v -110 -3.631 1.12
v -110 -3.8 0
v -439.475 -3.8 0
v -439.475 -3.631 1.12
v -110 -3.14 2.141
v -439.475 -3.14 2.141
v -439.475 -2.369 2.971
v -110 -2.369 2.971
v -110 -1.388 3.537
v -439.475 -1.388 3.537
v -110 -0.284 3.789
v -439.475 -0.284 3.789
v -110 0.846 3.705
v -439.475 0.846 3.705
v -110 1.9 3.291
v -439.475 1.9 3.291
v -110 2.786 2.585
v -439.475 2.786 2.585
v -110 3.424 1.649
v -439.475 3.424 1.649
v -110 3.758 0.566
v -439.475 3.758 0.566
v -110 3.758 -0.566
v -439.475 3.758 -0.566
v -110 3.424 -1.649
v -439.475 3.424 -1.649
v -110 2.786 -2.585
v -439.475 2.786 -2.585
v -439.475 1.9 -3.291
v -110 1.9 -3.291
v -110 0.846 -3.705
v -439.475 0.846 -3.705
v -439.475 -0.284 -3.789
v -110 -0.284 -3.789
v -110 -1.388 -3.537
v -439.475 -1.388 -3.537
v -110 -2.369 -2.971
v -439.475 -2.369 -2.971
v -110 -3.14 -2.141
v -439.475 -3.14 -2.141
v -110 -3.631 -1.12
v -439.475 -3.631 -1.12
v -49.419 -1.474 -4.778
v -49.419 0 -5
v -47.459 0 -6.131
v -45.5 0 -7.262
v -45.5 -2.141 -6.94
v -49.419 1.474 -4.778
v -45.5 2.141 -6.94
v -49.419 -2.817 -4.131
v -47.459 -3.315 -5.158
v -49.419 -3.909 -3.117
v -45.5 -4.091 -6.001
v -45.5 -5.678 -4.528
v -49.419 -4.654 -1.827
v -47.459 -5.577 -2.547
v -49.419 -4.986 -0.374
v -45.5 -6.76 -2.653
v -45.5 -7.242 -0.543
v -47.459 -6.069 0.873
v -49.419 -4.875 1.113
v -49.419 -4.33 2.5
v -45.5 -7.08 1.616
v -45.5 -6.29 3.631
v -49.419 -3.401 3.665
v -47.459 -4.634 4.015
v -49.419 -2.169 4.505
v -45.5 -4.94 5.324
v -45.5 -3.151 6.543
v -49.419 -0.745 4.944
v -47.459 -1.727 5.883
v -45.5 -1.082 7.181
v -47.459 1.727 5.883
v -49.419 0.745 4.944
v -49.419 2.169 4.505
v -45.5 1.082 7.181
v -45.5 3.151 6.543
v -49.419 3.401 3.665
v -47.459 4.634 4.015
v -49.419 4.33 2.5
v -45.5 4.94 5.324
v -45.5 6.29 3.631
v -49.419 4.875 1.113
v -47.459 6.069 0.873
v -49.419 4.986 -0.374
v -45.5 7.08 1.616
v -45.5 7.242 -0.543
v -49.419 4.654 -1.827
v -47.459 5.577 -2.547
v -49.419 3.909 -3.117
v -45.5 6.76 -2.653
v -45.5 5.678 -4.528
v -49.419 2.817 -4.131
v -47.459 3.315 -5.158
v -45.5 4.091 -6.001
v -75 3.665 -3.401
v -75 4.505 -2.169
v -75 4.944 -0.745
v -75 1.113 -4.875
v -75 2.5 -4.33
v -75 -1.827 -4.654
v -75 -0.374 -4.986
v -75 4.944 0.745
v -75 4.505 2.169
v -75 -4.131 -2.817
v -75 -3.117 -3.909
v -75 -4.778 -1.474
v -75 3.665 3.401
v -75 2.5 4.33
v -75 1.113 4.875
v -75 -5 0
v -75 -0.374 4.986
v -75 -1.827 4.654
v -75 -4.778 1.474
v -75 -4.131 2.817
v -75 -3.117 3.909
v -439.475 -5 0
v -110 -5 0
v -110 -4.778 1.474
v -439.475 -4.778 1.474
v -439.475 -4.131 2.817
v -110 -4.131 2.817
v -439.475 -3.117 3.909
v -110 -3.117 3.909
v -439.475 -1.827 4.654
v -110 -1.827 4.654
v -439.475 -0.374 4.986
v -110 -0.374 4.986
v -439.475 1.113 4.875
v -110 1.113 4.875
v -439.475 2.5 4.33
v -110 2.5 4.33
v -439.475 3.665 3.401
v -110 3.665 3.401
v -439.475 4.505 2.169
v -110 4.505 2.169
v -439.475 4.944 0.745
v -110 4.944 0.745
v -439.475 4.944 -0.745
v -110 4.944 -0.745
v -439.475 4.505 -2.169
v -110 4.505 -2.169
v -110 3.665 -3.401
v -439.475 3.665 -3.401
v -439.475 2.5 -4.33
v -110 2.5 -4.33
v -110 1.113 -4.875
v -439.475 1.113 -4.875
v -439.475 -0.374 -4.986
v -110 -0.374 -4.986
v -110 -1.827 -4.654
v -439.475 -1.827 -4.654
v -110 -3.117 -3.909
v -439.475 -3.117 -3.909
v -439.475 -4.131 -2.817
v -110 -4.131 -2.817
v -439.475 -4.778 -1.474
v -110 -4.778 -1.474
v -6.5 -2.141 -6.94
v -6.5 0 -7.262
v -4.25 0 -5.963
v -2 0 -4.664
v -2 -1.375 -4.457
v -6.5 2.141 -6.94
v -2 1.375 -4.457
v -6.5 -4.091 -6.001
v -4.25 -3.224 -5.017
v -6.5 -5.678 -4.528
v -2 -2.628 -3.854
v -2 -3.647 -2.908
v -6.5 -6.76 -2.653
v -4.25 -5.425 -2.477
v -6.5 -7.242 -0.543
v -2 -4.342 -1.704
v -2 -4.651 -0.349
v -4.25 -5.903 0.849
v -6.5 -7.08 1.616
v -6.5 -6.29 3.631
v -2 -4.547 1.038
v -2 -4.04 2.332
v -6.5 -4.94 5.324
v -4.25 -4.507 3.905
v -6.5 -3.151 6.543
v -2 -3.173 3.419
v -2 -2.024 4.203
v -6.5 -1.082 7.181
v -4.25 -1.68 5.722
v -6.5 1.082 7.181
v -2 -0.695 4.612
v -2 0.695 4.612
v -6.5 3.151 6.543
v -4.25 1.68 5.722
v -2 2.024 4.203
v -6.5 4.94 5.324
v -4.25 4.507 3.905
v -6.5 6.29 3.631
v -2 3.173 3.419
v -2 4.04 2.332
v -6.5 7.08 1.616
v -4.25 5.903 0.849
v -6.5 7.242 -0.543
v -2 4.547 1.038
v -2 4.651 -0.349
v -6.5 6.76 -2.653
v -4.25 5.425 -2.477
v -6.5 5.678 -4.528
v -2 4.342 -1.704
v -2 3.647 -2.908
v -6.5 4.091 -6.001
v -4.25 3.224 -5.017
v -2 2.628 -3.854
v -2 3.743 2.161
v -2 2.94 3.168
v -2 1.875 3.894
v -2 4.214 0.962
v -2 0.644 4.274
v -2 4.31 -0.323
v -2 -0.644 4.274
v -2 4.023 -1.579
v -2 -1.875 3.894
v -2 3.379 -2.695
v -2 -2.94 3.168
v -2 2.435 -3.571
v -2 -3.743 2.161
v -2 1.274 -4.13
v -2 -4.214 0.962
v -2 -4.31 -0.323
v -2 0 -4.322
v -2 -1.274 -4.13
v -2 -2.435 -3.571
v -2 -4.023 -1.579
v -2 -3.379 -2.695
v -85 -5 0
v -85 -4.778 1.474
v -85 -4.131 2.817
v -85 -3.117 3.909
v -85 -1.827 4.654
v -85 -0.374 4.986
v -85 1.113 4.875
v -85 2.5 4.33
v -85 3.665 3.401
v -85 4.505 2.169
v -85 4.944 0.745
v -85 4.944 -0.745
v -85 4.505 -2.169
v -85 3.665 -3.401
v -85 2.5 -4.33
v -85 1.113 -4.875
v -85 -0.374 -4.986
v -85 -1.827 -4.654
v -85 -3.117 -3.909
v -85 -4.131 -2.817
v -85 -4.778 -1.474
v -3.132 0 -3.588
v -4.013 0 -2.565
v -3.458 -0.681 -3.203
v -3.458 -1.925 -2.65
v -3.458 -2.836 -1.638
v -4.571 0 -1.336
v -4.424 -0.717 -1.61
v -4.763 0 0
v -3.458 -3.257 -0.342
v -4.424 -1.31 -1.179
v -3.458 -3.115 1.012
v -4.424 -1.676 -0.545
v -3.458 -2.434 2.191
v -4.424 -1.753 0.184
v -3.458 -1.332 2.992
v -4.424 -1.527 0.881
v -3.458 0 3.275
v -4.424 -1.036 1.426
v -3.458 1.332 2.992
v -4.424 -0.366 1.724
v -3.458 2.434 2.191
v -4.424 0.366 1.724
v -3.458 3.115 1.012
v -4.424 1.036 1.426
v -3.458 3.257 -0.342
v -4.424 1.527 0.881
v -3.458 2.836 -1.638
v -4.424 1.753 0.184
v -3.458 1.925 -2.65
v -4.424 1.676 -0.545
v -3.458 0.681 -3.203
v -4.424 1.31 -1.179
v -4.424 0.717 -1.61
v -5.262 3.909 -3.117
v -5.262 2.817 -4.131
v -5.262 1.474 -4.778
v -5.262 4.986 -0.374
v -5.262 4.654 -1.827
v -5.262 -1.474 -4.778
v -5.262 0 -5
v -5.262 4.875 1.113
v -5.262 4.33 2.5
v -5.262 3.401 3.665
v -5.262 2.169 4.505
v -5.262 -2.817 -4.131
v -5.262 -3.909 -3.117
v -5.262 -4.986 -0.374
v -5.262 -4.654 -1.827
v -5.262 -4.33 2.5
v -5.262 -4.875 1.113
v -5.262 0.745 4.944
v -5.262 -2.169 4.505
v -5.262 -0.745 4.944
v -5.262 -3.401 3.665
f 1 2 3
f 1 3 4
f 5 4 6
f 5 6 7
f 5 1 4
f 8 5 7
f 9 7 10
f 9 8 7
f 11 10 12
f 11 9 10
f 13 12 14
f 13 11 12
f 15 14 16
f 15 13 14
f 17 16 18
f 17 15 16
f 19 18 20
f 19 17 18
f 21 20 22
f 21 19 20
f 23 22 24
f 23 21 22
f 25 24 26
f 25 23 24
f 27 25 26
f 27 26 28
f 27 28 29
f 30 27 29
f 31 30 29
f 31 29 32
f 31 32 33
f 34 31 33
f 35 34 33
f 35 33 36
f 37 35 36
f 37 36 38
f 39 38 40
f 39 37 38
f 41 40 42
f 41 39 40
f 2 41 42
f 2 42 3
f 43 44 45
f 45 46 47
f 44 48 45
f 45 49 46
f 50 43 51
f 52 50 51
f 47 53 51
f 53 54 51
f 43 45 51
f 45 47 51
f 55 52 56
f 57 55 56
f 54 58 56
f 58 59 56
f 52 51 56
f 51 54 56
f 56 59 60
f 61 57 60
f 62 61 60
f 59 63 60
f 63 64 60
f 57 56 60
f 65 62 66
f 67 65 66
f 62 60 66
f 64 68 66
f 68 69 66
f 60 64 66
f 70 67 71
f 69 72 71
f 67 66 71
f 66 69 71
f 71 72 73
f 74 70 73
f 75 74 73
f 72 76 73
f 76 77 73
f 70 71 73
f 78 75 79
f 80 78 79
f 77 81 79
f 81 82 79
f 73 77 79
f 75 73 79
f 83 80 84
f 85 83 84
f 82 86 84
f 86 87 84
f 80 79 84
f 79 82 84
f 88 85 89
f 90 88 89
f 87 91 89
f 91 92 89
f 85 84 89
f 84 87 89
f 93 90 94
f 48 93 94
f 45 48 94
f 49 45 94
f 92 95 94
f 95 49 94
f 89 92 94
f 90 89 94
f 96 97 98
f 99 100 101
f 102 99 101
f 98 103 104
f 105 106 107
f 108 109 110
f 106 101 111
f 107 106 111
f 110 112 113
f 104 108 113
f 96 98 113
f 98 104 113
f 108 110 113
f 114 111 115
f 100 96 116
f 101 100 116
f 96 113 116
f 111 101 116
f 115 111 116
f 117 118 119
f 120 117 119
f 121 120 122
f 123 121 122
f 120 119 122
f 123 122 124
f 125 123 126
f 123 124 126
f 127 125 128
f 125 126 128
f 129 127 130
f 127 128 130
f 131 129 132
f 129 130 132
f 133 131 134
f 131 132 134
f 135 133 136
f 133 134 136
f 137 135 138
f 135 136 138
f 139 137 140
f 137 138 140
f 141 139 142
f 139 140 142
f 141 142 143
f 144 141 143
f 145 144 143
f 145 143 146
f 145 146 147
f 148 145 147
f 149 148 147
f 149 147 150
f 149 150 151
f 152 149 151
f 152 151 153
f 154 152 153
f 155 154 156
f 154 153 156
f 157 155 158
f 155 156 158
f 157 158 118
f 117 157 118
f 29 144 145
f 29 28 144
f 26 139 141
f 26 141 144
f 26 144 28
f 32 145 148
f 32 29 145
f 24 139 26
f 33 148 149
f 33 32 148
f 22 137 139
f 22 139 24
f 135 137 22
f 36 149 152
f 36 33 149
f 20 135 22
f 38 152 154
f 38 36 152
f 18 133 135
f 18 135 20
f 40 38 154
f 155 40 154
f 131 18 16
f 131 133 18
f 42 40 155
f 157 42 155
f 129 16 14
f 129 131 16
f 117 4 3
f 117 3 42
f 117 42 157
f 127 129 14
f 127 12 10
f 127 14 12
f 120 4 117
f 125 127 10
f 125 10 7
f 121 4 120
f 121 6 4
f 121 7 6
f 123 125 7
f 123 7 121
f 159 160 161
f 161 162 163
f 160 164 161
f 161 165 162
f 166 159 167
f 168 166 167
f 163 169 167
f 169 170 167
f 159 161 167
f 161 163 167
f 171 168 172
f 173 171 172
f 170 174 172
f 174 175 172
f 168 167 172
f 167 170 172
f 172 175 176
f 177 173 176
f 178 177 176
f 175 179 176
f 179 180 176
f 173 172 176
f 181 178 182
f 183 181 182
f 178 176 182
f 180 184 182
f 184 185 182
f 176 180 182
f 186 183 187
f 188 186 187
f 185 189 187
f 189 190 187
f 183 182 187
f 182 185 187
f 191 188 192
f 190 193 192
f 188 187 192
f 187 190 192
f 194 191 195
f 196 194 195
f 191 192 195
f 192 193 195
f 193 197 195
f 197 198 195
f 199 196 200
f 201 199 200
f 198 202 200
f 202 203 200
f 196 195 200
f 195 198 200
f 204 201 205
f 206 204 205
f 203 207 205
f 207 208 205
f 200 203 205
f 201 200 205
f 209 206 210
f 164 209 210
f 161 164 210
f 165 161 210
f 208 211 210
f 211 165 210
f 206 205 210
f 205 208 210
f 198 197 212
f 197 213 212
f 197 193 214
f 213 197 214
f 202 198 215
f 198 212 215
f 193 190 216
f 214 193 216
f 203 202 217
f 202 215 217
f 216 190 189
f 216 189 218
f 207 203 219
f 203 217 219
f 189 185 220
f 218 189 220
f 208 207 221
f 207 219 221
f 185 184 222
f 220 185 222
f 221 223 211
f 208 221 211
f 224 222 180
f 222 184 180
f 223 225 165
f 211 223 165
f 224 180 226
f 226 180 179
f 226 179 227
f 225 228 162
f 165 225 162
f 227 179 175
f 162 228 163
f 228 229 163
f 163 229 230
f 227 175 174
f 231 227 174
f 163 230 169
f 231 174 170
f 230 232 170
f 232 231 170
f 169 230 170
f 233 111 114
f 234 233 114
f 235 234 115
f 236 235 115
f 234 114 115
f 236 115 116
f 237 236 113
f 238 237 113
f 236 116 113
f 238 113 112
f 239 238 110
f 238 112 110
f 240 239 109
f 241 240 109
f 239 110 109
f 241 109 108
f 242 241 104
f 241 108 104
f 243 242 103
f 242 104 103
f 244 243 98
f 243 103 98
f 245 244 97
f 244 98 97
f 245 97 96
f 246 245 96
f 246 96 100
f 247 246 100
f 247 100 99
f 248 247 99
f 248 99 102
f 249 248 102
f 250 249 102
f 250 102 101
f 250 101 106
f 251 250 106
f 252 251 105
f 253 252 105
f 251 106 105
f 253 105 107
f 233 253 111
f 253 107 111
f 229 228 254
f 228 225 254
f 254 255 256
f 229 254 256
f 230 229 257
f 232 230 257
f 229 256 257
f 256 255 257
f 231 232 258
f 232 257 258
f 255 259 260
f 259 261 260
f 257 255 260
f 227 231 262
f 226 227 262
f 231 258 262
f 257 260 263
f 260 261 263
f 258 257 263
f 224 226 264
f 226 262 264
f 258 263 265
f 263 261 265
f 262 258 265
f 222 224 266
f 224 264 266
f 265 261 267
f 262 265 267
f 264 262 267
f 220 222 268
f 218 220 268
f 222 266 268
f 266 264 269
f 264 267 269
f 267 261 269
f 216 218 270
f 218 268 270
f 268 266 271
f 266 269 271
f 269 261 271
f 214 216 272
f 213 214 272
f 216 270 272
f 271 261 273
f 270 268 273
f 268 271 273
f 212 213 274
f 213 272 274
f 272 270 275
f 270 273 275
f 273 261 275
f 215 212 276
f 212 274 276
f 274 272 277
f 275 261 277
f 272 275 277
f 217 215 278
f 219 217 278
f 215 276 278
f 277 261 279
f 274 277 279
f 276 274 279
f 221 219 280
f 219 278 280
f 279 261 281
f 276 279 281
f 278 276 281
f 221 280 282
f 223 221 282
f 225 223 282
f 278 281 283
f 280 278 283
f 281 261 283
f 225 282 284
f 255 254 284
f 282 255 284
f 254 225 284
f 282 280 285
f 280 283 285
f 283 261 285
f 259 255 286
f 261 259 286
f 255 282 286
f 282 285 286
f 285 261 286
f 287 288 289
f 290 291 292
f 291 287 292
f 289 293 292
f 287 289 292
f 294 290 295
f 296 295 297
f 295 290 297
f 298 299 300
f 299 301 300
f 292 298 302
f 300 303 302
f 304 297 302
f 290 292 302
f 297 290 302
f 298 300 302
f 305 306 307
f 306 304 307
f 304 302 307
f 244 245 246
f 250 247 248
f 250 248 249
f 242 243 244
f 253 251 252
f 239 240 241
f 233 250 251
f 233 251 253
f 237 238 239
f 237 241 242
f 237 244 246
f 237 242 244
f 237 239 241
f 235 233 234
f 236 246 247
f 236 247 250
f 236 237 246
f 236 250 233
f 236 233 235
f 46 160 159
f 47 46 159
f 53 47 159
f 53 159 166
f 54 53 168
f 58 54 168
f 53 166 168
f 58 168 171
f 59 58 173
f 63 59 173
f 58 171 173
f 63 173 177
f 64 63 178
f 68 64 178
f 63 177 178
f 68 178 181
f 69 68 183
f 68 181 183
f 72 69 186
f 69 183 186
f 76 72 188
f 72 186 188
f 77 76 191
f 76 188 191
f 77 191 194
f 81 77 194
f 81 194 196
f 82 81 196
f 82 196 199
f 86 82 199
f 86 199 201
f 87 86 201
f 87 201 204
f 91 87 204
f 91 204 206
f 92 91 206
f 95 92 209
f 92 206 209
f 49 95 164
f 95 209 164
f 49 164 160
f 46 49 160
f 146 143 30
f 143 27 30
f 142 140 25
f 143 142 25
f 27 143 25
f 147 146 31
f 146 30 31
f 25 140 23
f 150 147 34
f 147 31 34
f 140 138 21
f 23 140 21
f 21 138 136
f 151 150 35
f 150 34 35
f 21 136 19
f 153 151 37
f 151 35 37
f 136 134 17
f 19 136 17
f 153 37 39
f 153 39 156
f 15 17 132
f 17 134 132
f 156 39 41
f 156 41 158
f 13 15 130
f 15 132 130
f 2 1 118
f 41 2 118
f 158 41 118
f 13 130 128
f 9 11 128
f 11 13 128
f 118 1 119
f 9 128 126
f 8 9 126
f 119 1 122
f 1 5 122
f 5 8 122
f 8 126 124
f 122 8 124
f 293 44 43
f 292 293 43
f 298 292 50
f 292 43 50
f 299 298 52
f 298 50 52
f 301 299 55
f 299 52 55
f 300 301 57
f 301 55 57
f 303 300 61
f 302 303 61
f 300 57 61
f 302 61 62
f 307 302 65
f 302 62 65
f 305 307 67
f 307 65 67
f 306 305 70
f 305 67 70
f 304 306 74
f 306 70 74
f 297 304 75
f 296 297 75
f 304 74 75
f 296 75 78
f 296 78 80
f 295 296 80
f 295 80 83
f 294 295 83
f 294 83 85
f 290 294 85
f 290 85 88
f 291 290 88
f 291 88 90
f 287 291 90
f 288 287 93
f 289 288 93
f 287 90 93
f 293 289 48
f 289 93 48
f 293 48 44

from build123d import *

# Parameters (mm, degrees)
F3_R     = 5
F4_DEPTH = 10
F6_R     = 5
F6_R_2   = 3.8
F7_DEPTH = 329.475


# Not quite as in the source:
# - a fillet or chamfer that OpenCascade refuses, or shapes differently, is made with other operations: its cross-section is extruded or revolved along the edge and cut away or added


with BuildPart() as f1:
    # F0 (on Front) → F1 (revolve)
    with BuildSketch(Plane.XZ):
        with BuildLine():
            Line((-50, -7.2625), (-2, -7.2625))
            Line((-2, -7.2625), (-2, -4.3221992377))
            ThreePointArc((-2, -4.3221992377), (-4.0128796549, -2.5648007964), (-4.7625, 0))
            Line((-4.7625, 0), (-5.2625, 0))
            Line((-5.2625, 0), (-5.2625, -5))
            Line((-5.2625, -5), (-50, -5))
            Line((-50, -5), (-50, -7.2625))
        make_face()
    revolve(axis=Axis((-5.0125, 0, 0), (-1, 0, 0)))

    # F8: chamfer of 4.5 x 2.5980762114 on 2 edges, made by hand

    # F8_s1 → F8_t2 (revolve, cut)
    with BuildSketch(Plane.XZ):
        Polygon((-50, -4.6644237886), (-45.5, -7.2625), (-50, -7.2625), align=None)
    revolve(axis=Axis((-50, 0, 0), (-1, 0, 0)), mode=Mode.SUBTRACT)

    # F8_s3 → F8_t4 (revolve, cut)
    with BuildSketch(Plane.XZ):
        Polygon((-6.5, -7.2625), (-2, -4.6644237886), (-2, -7.2625), align=None)
    revolve(axis=Axis((-2, 0, 0), (-1, 0, 0)), mode=Mode.SUBTRACT)


with BuildPart() as f4:
    # F3 (on offset) → F4 (new body)
    with BuildSketch(Plane(origin=(-75, 0, 0), x_dir=(0, -1, 0), z_dir=(-1, 0, 0))):
        Circle(F3_R)
    extrude(amount=F4_DEPTH)


with BuildPart() as f7:
    # F6 (on offset) → F7 (new body)
    with BuildSketch(Plane(origin=(-110, 0, 0), x_dir=(0, -1, 0), z_dir=(-1, 0, 0))):
        Circle(F6_R)
        Circle(F6_R_2, mode=Mode.SUBTRACT)
    extrude(amount=F7_DEPTH)


solid = Compound([f1.part, f4.part, f7.part])
